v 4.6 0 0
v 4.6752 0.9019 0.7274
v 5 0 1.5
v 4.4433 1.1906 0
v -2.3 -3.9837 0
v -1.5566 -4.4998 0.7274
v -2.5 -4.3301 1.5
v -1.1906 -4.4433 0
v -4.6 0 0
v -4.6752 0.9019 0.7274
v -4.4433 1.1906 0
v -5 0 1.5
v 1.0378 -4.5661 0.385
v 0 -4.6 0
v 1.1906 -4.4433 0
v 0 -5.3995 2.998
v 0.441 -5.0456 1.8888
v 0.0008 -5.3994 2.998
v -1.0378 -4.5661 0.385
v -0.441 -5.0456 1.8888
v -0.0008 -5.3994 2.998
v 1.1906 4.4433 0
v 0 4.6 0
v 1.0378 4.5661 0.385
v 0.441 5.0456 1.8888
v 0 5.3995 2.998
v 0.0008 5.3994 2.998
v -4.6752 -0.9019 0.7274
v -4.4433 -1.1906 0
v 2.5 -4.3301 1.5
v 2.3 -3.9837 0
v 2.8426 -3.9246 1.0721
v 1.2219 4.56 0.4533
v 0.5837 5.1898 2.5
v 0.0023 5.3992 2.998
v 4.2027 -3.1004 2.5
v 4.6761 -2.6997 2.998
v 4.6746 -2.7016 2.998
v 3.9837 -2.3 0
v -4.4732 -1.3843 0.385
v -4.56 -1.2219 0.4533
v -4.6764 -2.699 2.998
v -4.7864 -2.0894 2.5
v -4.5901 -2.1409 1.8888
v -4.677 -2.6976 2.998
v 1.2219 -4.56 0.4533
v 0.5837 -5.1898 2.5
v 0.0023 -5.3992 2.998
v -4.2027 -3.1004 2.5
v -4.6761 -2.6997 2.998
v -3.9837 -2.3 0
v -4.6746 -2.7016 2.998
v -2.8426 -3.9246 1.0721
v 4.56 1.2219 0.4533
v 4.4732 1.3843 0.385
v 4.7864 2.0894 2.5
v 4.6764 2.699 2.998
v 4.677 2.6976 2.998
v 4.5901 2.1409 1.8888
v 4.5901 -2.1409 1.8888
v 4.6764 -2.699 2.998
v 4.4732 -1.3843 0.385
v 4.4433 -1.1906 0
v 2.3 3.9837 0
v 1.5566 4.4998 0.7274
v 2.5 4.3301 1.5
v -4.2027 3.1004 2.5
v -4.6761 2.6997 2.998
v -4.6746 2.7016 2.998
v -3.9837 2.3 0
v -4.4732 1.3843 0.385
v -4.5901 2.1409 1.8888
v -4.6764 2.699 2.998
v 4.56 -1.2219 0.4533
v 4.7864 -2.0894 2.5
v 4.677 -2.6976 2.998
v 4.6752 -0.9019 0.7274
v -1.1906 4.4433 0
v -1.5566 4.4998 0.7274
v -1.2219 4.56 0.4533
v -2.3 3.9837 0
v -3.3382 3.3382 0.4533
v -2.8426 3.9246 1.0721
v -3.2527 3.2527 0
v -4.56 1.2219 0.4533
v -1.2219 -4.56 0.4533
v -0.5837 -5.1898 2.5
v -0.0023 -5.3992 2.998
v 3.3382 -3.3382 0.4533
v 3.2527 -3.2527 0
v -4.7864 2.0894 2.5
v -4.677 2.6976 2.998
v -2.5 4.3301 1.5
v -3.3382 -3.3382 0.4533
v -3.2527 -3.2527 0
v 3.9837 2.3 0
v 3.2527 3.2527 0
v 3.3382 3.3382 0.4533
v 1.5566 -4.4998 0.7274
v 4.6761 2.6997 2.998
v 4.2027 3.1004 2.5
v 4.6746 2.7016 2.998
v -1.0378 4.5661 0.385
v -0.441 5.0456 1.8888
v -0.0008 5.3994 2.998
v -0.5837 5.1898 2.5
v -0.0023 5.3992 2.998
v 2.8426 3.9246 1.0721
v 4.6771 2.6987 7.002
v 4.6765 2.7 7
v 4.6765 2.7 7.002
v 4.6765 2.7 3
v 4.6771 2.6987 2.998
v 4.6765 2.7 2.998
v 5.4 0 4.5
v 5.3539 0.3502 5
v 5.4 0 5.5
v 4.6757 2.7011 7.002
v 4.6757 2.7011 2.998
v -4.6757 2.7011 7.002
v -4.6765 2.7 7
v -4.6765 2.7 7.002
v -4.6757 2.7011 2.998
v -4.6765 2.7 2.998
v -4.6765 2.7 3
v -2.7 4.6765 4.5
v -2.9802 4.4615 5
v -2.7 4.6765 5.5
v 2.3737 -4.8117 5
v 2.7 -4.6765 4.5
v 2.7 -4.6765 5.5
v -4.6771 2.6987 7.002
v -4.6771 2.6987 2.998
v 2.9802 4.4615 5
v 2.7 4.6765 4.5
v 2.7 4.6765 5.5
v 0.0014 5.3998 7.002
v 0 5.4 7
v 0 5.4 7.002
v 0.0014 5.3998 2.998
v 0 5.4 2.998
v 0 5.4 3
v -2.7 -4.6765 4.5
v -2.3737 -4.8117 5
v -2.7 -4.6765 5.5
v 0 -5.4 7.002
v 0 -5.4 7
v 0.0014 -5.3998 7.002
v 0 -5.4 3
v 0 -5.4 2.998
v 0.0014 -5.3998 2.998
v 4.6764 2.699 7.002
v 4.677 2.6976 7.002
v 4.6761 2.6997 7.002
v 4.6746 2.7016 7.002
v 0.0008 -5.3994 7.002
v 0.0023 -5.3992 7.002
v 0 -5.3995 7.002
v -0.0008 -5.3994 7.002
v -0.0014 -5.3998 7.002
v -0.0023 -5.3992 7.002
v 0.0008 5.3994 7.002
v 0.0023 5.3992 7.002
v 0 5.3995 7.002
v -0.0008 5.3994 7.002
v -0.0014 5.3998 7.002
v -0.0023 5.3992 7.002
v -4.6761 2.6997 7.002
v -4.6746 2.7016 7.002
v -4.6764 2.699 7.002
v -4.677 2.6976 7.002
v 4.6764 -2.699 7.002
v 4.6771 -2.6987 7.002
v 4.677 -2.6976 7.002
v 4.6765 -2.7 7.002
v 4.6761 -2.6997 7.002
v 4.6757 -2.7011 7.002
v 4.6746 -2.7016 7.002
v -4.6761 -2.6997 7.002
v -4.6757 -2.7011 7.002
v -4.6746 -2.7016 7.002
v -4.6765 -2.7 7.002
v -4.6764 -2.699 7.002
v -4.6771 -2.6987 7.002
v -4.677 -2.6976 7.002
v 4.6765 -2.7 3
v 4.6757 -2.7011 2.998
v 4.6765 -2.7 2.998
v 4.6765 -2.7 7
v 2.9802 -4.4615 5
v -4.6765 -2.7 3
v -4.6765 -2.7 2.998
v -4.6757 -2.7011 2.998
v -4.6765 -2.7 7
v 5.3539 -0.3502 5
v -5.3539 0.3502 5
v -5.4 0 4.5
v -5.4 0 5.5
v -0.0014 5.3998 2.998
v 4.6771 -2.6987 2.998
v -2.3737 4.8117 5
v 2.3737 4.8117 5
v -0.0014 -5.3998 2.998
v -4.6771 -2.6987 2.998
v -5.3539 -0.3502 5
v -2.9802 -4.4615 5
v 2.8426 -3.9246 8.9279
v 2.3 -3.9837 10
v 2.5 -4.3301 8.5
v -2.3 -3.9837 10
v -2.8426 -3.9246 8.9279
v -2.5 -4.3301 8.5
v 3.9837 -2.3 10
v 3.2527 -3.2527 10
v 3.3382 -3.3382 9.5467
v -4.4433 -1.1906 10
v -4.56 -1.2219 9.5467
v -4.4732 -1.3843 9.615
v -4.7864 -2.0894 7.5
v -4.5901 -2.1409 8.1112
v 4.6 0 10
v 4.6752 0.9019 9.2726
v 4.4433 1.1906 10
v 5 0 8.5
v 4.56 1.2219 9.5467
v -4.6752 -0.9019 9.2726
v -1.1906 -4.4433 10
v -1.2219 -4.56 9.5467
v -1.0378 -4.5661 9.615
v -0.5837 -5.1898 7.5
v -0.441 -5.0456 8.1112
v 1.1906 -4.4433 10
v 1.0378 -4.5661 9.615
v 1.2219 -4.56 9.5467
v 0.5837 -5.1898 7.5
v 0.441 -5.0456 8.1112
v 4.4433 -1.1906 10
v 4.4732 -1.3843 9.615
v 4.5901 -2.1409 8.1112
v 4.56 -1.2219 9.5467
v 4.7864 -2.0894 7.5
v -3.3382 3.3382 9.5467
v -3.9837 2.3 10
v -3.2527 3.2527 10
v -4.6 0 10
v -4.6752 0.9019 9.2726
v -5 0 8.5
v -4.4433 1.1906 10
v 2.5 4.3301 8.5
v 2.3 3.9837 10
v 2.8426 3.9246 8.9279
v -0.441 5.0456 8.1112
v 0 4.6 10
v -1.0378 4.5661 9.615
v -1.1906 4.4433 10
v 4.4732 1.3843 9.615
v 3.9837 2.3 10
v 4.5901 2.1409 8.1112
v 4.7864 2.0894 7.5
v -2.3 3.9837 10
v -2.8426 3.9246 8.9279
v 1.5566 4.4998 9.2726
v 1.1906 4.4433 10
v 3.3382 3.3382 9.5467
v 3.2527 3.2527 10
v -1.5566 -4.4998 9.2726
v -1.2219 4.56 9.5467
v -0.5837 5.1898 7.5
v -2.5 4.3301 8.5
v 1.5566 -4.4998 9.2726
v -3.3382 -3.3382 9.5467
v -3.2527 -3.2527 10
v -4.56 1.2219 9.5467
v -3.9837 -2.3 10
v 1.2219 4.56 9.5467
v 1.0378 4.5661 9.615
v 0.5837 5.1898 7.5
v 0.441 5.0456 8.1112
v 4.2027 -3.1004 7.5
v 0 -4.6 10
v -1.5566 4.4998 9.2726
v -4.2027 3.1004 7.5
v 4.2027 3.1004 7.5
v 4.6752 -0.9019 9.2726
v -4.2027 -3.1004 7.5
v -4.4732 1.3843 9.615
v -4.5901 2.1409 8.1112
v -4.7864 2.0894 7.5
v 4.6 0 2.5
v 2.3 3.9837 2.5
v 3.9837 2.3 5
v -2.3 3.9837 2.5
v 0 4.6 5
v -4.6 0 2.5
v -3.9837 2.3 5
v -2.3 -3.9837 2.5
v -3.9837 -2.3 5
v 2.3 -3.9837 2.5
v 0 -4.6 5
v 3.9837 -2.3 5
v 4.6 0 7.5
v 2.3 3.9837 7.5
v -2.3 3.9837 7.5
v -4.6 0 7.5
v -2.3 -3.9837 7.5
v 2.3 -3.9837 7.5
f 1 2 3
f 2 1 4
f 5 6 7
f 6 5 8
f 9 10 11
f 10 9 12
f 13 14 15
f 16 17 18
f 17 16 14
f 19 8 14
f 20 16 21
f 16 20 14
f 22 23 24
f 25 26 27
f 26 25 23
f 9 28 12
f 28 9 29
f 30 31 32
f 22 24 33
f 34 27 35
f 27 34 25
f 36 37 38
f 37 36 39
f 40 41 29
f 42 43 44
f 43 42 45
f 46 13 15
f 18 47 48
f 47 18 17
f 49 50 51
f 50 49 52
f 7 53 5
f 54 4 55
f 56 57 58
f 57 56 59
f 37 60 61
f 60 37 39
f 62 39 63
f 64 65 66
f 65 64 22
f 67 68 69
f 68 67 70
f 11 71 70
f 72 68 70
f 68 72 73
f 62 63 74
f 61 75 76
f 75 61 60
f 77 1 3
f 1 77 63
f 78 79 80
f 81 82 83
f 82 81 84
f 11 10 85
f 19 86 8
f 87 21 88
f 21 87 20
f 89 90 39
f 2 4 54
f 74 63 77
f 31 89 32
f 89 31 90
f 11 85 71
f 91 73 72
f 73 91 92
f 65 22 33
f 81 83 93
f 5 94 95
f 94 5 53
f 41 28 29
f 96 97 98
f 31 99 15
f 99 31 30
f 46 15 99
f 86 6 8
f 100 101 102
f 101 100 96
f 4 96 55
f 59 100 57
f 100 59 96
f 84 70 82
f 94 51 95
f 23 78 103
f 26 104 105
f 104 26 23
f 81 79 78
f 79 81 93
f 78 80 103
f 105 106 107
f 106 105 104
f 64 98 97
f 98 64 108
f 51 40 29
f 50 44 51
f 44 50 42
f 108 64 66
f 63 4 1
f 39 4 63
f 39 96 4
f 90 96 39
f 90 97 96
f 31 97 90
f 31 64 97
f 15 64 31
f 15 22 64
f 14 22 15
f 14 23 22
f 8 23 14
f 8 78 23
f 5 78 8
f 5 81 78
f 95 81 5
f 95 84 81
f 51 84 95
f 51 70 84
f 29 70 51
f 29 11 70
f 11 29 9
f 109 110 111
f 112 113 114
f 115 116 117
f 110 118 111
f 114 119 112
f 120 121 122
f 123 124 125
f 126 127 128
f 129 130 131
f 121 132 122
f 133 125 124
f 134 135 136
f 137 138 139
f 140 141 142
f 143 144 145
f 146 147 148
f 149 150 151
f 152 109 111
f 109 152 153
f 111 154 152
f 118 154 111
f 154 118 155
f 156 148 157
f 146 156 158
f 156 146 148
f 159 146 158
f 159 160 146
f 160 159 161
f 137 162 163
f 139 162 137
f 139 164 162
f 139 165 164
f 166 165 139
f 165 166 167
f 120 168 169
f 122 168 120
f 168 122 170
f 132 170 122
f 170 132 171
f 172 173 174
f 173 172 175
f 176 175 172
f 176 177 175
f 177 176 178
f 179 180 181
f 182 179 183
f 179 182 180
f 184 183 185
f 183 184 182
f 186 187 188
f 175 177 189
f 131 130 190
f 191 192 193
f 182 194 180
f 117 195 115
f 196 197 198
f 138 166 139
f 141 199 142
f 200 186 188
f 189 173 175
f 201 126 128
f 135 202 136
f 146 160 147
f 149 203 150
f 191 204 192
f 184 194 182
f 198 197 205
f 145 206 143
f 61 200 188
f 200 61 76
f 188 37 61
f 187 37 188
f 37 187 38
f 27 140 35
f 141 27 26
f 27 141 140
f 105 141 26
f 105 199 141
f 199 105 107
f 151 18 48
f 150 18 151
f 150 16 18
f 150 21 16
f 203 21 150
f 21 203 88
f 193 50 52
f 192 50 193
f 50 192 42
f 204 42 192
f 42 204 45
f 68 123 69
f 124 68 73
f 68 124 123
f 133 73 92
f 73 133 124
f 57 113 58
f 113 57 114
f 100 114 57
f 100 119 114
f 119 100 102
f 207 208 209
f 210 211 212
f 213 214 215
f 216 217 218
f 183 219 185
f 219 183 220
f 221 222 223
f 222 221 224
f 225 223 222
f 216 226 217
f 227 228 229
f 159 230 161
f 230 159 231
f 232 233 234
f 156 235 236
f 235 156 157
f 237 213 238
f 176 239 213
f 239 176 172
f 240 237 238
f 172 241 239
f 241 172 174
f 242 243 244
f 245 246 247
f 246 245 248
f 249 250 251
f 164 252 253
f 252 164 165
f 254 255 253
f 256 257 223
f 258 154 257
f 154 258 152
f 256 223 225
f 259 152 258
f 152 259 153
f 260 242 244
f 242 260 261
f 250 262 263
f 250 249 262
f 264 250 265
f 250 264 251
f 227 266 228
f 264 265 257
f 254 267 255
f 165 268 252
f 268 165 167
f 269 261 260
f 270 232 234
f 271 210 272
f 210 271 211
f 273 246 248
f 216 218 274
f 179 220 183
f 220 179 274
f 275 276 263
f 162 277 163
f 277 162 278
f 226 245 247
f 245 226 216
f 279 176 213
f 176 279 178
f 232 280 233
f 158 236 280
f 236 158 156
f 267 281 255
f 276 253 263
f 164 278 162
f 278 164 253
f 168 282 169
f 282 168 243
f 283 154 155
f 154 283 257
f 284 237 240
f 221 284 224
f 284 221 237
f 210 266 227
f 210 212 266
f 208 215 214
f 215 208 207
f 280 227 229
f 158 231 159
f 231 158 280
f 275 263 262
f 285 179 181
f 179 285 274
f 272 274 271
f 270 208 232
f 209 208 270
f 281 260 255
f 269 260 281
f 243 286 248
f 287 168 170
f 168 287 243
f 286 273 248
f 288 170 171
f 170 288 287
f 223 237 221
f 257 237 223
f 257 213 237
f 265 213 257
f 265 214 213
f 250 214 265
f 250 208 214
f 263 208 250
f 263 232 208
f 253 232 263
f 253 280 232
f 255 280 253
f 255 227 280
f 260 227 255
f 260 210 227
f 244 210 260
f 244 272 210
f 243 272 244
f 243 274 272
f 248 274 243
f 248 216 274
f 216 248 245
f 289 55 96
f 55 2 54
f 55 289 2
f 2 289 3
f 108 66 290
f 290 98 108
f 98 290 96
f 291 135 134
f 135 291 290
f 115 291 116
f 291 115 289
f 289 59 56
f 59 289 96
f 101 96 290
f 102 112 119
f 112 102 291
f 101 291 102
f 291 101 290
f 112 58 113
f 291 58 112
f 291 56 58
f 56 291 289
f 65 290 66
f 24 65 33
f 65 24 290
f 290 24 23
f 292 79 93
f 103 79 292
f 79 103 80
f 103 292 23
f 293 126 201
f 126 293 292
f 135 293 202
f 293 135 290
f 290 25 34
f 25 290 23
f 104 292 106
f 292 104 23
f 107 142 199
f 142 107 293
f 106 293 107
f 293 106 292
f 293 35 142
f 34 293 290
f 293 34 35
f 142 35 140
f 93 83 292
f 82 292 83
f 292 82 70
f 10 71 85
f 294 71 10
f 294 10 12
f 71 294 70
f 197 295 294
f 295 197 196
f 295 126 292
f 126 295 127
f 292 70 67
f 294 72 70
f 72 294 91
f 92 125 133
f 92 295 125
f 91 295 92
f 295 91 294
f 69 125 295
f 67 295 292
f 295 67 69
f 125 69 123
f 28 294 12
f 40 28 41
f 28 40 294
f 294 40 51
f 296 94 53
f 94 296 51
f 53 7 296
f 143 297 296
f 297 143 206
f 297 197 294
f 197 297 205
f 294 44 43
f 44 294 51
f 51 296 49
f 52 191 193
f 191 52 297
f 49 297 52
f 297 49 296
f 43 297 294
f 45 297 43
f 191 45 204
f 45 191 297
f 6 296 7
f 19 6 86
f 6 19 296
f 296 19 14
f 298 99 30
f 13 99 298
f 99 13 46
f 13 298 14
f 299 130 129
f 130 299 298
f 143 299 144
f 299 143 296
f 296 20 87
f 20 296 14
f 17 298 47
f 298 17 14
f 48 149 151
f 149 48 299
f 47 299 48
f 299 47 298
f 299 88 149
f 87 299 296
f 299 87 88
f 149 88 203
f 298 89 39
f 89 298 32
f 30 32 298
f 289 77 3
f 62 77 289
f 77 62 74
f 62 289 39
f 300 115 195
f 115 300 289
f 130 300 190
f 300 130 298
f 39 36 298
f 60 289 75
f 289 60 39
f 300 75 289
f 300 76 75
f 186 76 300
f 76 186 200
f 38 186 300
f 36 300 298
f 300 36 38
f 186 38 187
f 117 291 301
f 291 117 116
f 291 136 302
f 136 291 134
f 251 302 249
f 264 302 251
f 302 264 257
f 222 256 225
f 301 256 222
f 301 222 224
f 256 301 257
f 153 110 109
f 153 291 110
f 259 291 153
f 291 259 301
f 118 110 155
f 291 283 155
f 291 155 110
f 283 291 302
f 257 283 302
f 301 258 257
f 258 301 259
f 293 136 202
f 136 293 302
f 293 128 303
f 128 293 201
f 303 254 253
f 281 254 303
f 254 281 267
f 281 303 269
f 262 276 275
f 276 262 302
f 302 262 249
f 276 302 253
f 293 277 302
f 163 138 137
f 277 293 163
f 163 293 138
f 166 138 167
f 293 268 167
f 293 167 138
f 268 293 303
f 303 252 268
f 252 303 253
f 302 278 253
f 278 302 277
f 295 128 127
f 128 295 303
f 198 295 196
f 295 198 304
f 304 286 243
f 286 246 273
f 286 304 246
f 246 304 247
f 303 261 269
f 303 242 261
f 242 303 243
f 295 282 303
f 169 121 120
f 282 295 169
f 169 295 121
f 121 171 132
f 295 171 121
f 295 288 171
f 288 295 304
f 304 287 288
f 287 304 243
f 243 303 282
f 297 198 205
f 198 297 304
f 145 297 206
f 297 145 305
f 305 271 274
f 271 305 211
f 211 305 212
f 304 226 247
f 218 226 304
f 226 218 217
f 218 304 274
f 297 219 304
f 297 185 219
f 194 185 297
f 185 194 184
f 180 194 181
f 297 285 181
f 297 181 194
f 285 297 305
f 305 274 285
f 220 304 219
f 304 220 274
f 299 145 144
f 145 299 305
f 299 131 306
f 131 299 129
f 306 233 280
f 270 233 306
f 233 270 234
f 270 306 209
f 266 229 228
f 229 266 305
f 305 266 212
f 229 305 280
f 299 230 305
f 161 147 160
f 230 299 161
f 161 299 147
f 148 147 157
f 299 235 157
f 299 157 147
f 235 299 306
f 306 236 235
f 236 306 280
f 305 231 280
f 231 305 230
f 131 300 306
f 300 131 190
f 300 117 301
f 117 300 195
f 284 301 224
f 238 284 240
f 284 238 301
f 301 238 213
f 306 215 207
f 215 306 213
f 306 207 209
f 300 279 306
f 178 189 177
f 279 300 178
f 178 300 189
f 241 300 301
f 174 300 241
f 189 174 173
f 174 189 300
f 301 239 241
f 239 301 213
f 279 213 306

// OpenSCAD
/*
 * knurledFinishLib.scad
 * 
 * Written by aubenc @ Thingiverse
 *
 * This script is licensed under the Public Domain license.
 *
 * http://www.thingiverse.com/thing:9095
 *
 * Usage:
 *
 *    knurled_cyl( Knurled cylinder height,
 *                 Knurled cylinder outer diameter,
 *                 Knurl polyhedron width,
 *                 Knurl polyhedron height,
 *                 Knurl polyhedron depth,
 *                 Cylinder ends smoothed height,
 *                 Knurled surface smoothing amount );
 */
module knurled_cyl(chg, cod, cwd, csh, cdp, fsh, smt)
{
    cord=(cod+cdp+cdp*smt/100)/2;
    cird=cord-cdp;
    cfn=round(2*cird*PI/cwd);
    clf=360/cfn;
    crn=ceil(chg/csh);

    intersection()
    {
        shape(fsh, cird, cord-cdp*smt/100, cfn*4, chg);

        translate([0,0,-(crn*csh-chg)/2])
          knurled_finish(cord, cird, clf, csh, cfn, crn);
    }
}

module shape(hsh, ird, ord, fn4, hg)
{
        union()
        {
            cylinder(h=hsh, r1=ird, r2=ord, $fn=fn4, center=false);

            translate([0,0,hsh-0.002])
              cylinder(h=hg-2*hsh+0.004, r=ord, $fn=fn4, center=false);

            translate([0,0,hg-hsh])
              cylinder(h=hsh, r1=ord, r2=ird, $fn=fn4, center=false);
        }

}

module knurled_finish(ord, ird, lf, sh, fn, rn)
{
    for(j=[0:rn-1])
    assign(h0=sh*j, h1=sh*(j+1/2), h2=sh*(j+1))
    {
        for(i=[0:fn-1])
        assign(lf0=lf*i, lf1=lf*(i+1/2), lf2=lf*(i+1))
        {
            polyhedron(
                points=[
                     [ 0,0,h0],
                     [ ord*cos(lf0), ord*sin(lf0), h0],
                     [ ird*cos(lf1), ird*sin(lf1), h0],
                     [ ord*cos(lf2), ord*sin(lf2), h0],

                     [ ird*cos(lf0), ird*sin(lf0), h1],
                     [ ord*cos(lf1), ord*sin(lf1), h1],
                     [ ird*cos(lf2), ird*sin(lf2), h1],

                     [ 0,0,h2],
                     [ ord*cos(lf0), ord*sin(lf0), h2],
                     [ ird*cos(lf1), ird*sin(lf1), h2],
                     [ ord*cos(lf2), ord*sin(lf2), h2]
                    ],
                triangles=[
                     [0,1,2],[2,3,0],
                     [1,0,4],[4,0,7],[7,8,4],
                     [8,7,9],[10,9,7],
                     [10,7,6],[6,7,0],[3,6,0],
                     [2,1,4],[3,2,6],[10,6,9],[8,9,4],
                     [4,5,2],[2,5,6],[6,5,9],[9,5,4]
                    ],
                convexity=5);
         }
    }
}

//knurled_cyl(chg, cod, cwd, csh, cdp, fsh, smt);
knurled_cyl(10, 10, 5, 5, 1, 3, 20);
